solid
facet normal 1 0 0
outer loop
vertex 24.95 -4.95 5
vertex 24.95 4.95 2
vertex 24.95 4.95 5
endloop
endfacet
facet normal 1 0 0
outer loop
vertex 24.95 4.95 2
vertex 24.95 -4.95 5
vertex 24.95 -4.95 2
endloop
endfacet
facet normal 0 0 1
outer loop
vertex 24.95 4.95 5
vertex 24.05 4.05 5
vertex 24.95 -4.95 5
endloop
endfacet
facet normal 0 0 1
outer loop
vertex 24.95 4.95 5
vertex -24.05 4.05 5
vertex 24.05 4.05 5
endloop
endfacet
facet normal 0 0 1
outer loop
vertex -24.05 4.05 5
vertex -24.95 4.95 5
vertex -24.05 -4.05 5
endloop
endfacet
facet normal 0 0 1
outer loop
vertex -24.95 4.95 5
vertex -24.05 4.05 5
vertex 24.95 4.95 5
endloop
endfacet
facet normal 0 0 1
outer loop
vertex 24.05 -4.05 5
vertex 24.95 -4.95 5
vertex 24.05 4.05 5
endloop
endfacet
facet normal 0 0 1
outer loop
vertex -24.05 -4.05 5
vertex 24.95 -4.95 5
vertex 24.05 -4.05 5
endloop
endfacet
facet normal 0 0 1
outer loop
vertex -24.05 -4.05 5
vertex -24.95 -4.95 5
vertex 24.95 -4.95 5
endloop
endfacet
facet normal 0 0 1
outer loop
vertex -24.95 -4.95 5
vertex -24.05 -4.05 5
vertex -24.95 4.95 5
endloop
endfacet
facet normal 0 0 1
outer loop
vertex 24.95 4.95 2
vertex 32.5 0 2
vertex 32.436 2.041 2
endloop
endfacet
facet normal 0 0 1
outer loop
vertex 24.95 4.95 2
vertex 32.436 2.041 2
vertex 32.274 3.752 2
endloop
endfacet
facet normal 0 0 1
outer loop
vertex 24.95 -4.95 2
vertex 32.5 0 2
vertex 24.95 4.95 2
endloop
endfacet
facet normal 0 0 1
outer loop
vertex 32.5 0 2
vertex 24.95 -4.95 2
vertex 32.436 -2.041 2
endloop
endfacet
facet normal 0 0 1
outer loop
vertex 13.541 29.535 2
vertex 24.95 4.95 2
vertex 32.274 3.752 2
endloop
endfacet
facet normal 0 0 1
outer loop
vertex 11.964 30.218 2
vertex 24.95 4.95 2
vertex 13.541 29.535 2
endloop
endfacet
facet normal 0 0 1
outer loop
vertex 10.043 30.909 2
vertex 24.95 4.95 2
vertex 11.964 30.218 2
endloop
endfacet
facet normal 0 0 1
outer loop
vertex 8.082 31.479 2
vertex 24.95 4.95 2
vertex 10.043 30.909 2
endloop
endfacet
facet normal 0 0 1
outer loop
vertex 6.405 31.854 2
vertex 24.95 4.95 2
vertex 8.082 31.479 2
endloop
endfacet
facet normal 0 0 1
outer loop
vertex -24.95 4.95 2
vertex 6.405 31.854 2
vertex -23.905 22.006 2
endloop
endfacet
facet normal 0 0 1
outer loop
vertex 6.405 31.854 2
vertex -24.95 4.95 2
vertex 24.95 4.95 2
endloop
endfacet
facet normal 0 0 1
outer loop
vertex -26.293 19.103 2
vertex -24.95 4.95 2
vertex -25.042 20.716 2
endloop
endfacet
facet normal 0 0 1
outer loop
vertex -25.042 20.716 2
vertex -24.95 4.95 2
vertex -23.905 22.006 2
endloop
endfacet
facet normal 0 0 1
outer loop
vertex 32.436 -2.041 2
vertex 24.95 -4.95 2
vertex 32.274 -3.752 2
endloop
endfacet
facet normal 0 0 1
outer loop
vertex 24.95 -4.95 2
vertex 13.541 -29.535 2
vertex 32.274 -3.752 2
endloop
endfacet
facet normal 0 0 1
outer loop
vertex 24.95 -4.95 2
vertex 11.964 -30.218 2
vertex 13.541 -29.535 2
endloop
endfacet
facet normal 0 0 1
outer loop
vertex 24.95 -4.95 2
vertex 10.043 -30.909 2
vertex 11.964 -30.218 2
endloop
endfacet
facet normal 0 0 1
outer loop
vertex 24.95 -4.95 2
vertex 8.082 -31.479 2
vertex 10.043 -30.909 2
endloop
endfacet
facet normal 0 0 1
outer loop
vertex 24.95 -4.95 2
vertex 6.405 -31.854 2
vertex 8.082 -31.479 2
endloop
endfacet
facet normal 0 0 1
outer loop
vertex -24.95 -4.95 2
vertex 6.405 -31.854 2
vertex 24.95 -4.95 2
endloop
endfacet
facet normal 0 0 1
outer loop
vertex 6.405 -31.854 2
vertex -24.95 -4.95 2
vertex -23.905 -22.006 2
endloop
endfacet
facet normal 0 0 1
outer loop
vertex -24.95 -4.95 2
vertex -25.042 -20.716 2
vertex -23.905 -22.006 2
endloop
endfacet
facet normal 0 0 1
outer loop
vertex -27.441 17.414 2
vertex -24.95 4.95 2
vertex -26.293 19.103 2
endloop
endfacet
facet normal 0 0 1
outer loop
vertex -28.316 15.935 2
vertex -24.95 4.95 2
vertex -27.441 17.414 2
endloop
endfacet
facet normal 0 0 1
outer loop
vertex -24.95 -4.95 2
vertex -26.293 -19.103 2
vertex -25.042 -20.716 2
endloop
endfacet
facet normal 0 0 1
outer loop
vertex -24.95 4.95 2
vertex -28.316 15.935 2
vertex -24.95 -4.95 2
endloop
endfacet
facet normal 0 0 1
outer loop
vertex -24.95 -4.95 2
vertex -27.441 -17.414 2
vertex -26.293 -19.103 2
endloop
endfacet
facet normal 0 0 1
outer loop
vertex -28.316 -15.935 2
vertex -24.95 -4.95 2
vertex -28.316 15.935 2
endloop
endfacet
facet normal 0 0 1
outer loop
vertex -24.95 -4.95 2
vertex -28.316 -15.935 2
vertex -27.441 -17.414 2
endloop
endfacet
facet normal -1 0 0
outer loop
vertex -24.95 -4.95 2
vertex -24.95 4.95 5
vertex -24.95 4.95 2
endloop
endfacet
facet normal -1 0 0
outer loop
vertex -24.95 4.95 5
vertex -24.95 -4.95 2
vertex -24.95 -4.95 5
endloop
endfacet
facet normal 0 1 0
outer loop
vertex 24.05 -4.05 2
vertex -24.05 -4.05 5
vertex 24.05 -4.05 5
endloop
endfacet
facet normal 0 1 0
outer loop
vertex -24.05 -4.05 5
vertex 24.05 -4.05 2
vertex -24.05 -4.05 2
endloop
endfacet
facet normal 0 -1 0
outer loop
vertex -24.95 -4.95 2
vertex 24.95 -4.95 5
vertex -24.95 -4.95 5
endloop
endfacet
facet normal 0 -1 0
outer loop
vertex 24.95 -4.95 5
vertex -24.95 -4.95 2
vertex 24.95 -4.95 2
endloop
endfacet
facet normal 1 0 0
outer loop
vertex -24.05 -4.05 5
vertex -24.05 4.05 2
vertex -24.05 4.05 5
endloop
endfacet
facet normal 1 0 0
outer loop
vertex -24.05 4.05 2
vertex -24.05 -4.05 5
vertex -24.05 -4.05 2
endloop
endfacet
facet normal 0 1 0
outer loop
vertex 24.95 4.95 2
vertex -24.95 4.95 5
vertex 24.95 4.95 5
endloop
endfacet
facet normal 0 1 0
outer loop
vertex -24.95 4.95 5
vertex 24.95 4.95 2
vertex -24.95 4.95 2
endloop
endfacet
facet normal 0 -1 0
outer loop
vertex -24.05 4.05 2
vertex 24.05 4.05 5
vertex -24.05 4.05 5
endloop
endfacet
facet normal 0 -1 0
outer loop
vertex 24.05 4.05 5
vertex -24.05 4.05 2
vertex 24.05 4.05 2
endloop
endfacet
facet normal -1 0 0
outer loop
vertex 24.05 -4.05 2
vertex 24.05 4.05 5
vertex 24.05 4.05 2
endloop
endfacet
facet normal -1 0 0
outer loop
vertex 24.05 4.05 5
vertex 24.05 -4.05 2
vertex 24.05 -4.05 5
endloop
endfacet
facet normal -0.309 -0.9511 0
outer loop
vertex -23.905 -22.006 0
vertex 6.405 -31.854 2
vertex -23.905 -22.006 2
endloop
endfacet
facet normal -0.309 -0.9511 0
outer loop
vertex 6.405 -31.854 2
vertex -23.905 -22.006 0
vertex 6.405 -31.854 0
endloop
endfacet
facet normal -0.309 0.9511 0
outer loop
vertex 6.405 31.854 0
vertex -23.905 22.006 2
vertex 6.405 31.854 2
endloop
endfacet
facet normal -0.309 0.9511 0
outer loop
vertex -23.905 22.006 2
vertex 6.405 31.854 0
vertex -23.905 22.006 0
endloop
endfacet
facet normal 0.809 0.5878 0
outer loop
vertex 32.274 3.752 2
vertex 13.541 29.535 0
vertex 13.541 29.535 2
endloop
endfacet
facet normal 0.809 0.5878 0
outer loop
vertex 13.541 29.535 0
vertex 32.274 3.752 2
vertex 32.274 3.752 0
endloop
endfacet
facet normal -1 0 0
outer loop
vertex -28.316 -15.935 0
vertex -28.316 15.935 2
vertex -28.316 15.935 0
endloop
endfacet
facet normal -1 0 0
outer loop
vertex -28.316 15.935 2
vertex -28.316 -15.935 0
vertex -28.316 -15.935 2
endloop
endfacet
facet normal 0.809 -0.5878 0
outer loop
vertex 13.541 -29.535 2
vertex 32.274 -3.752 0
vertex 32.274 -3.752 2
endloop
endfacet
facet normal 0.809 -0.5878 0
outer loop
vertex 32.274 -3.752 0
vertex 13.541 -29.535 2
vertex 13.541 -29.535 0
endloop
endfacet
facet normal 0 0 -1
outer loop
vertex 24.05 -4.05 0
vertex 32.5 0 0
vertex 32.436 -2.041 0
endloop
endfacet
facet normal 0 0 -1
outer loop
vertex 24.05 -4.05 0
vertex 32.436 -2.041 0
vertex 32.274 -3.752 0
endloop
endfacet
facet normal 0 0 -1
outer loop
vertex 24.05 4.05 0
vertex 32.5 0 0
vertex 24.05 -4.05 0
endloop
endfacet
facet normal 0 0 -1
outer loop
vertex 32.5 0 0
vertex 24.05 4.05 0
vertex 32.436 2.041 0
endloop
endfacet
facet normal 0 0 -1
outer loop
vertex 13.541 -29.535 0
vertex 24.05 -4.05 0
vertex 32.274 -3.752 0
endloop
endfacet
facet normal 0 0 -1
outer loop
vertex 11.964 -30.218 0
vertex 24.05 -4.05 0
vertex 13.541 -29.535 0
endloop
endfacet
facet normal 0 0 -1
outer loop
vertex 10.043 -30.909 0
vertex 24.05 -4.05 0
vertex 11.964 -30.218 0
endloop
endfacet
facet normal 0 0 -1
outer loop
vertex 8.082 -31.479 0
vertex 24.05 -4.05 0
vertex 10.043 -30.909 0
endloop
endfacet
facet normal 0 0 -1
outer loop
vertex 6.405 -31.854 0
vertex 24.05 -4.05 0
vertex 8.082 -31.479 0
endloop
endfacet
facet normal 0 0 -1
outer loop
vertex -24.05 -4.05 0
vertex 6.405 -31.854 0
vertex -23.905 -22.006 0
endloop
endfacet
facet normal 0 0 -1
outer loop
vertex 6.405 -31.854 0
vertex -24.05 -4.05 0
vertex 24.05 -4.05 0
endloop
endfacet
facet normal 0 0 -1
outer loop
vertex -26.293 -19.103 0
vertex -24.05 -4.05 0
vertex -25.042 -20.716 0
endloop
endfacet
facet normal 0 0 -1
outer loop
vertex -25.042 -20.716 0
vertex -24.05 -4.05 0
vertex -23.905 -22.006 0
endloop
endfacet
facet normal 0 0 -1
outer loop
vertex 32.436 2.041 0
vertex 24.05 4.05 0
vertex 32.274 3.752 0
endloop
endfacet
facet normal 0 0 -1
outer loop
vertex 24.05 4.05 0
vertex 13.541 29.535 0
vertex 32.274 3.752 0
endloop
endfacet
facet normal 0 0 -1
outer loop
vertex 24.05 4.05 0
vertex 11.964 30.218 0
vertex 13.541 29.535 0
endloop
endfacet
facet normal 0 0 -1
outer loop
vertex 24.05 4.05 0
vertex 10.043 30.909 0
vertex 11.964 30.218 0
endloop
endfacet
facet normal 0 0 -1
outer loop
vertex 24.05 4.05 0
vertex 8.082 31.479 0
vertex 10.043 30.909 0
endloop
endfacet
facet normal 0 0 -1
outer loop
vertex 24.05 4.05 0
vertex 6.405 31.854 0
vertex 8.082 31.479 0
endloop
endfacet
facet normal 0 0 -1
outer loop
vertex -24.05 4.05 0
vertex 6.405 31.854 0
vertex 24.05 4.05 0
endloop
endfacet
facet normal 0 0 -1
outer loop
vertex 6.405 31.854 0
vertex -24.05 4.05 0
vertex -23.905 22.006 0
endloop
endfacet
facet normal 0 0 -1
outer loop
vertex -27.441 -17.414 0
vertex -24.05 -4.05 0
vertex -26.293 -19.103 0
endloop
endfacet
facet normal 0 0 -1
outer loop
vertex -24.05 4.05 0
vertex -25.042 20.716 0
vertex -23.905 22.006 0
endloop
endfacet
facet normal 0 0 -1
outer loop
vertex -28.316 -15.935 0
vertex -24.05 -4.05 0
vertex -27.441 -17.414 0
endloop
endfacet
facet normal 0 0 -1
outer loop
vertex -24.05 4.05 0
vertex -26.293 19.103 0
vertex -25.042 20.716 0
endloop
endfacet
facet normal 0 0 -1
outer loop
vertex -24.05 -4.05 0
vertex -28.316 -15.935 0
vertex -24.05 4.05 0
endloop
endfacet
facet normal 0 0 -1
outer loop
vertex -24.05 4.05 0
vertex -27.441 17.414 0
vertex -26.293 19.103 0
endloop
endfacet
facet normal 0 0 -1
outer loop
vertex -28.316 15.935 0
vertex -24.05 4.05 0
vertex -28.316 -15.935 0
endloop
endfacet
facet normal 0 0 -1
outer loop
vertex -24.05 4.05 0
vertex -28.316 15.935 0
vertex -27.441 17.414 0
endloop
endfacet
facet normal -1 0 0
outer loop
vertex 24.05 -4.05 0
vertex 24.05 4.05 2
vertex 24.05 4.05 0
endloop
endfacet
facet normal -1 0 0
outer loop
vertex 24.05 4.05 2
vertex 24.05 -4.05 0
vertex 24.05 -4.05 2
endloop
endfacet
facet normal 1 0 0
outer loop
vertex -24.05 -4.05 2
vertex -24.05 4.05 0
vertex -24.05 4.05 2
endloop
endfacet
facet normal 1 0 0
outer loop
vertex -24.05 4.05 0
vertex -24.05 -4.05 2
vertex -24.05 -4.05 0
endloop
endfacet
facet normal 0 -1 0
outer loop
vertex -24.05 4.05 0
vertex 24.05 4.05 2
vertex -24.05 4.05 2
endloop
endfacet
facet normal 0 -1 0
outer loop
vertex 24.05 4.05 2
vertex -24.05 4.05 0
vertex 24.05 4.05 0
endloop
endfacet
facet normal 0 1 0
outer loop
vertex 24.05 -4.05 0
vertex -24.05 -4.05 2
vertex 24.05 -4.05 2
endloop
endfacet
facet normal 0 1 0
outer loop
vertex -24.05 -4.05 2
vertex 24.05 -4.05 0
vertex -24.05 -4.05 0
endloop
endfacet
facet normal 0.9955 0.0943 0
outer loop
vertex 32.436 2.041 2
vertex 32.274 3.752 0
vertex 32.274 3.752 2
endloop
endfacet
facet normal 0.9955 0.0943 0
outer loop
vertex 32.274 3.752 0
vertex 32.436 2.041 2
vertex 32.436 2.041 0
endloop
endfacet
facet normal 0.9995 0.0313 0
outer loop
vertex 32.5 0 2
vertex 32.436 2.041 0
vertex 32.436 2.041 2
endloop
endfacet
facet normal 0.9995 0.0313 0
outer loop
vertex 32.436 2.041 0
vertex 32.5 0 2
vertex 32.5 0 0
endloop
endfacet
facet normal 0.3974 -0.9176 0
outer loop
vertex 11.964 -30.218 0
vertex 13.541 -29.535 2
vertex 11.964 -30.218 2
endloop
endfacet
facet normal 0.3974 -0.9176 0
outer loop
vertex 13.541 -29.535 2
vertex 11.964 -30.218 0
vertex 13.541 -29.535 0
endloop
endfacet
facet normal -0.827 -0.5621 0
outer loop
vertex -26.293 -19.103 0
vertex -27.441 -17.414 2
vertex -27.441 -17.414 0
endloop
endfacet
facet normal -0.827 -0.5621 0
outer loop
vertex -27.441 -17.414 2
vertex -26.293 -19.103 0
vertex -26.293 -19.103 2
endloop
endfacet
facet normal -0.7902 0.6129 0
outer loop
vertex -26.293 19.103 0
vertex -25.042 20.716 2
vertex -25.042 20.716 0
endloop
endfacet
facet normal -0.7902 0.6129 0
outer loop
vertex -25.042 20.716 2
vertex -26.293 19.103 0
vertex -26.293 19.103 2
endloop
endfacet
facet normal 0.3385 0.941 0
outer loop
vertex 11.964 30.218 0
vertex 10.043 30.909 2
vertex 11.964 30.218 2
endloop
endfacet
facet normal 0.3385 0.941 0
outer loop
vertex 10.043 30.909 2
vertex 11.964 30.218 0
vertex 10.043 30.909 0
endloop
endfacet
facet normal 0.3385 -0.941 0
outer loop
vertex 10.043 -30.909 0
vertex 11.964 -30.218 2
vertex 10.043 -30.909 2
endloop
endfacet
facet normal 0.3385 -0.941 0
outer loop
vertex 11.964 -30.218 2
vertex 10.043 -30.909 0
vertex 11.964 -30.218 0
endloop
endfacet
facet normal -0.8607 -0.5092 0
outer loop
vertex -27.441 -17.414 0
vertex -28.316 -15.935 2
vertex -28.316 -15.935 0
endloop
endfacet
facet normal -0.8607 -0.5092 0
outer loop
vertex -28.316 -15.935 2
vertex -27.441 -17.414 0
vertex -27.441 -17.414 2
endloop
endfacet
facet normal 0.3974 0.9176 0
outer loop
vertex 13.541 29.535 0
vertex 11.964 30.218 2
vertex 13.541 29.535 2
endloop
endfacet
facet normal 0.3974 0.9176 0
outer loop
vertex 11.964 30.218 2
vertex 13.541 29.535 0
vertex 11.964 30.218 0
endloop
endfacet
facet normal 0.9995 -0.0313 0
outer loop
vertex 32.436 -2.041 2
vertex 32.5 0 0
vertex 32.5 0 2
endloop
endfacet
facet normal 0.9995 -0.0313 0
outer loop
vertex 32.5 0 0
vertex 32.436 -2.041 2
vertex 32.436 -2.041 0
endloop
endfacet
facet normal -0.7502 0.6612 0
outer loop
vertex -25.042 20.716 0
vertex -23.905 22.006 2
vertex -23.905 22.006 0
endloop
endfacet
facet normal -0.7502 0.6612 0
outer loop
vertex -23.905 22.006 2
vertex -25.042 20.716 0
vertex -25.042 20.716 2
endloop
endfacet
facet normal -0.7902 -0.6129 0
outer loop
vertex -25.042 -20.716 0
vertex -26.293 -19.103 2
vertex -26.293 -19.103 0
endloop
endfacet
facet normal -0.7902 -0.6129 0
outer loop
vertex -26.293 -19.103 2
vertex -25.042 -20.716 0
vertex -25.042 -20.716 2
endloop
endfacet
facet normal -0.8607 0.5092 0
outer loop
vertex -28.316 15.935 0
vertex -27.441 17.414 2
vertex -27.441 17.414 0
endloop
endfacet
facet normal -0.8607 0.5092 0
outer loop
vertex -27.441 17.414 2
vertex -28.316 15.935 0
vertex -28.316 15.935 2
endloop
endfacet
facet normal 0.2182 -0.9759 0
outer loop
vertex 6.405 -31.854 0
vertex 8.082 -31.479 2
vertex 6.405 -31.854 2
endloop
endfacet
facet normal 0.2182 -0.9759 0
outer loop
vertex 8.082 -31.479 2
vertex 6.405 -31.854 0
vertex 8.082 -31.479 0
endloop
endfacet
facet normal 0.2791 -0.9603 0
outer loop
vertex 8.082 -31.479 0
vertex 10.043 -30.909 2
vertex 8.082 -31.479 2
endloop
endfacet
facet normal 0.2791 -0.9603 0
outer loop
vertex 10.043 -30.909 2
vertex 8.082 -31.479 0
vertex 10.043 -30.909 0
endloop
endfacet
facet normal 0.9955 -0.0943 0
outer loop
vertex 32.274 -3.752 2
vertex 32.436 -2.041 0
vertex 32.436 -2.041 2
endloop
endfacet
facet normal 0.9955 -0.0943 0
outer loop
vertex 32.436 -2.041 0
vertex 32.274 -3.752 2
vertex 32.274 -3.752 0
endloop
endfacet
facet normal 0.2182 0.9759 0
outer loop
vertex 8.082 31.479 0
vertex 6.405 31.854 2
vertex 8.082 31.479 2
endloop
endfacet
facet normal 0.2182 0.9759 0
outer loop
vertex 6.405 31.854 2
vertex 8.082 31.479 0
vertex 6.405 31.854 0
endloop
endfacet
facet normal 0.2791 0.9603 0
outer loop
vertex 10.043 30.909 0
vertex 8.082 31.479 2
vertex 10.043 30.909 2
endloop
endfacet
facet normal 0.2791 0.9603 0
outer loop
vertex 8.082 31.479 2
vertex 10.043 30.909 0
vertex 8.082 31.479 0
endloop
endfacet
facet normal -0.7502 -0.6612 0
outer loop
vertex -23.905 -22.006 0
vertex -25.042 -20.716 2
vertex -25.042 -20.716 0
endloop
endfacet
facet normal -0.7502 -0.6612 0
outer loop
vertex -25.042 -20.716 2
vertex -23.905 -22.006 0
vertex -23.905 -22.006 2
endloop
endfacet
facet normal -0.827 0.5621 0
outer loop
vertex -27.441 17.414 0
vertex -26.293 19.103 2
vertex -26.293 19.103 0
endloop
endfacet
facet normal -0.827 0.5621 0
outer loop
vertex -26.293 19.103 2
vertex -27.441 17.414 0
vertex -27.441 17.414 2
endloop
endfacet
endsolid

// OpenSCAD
translate([- 49.9 / 2, - 9.9 / 2, 2])
union(){
    cube([49.9, 0.9, 3]);
    cube([0.9, 9.9, 3]);
    translate([0, 9, 0])
    cube([49.9, 0.9, 3]);
    translate([49, 0, 0])
    cube([0.9, 9.9, 3]);
}

intersection(){
    difference(){
        cylinder(h = 2, d = 70, $fn=5, center = false);
        translate([- 49.9 / 2 + 0.9, - 9.9 / 2 + 0.9, 0])
        cube([49.9 - 2 * 0.9, 9.9 - 2 * 0.9, 2], false);
    }
    cylinder(h = 2, d = 65, $fn=100, center = false);
}
